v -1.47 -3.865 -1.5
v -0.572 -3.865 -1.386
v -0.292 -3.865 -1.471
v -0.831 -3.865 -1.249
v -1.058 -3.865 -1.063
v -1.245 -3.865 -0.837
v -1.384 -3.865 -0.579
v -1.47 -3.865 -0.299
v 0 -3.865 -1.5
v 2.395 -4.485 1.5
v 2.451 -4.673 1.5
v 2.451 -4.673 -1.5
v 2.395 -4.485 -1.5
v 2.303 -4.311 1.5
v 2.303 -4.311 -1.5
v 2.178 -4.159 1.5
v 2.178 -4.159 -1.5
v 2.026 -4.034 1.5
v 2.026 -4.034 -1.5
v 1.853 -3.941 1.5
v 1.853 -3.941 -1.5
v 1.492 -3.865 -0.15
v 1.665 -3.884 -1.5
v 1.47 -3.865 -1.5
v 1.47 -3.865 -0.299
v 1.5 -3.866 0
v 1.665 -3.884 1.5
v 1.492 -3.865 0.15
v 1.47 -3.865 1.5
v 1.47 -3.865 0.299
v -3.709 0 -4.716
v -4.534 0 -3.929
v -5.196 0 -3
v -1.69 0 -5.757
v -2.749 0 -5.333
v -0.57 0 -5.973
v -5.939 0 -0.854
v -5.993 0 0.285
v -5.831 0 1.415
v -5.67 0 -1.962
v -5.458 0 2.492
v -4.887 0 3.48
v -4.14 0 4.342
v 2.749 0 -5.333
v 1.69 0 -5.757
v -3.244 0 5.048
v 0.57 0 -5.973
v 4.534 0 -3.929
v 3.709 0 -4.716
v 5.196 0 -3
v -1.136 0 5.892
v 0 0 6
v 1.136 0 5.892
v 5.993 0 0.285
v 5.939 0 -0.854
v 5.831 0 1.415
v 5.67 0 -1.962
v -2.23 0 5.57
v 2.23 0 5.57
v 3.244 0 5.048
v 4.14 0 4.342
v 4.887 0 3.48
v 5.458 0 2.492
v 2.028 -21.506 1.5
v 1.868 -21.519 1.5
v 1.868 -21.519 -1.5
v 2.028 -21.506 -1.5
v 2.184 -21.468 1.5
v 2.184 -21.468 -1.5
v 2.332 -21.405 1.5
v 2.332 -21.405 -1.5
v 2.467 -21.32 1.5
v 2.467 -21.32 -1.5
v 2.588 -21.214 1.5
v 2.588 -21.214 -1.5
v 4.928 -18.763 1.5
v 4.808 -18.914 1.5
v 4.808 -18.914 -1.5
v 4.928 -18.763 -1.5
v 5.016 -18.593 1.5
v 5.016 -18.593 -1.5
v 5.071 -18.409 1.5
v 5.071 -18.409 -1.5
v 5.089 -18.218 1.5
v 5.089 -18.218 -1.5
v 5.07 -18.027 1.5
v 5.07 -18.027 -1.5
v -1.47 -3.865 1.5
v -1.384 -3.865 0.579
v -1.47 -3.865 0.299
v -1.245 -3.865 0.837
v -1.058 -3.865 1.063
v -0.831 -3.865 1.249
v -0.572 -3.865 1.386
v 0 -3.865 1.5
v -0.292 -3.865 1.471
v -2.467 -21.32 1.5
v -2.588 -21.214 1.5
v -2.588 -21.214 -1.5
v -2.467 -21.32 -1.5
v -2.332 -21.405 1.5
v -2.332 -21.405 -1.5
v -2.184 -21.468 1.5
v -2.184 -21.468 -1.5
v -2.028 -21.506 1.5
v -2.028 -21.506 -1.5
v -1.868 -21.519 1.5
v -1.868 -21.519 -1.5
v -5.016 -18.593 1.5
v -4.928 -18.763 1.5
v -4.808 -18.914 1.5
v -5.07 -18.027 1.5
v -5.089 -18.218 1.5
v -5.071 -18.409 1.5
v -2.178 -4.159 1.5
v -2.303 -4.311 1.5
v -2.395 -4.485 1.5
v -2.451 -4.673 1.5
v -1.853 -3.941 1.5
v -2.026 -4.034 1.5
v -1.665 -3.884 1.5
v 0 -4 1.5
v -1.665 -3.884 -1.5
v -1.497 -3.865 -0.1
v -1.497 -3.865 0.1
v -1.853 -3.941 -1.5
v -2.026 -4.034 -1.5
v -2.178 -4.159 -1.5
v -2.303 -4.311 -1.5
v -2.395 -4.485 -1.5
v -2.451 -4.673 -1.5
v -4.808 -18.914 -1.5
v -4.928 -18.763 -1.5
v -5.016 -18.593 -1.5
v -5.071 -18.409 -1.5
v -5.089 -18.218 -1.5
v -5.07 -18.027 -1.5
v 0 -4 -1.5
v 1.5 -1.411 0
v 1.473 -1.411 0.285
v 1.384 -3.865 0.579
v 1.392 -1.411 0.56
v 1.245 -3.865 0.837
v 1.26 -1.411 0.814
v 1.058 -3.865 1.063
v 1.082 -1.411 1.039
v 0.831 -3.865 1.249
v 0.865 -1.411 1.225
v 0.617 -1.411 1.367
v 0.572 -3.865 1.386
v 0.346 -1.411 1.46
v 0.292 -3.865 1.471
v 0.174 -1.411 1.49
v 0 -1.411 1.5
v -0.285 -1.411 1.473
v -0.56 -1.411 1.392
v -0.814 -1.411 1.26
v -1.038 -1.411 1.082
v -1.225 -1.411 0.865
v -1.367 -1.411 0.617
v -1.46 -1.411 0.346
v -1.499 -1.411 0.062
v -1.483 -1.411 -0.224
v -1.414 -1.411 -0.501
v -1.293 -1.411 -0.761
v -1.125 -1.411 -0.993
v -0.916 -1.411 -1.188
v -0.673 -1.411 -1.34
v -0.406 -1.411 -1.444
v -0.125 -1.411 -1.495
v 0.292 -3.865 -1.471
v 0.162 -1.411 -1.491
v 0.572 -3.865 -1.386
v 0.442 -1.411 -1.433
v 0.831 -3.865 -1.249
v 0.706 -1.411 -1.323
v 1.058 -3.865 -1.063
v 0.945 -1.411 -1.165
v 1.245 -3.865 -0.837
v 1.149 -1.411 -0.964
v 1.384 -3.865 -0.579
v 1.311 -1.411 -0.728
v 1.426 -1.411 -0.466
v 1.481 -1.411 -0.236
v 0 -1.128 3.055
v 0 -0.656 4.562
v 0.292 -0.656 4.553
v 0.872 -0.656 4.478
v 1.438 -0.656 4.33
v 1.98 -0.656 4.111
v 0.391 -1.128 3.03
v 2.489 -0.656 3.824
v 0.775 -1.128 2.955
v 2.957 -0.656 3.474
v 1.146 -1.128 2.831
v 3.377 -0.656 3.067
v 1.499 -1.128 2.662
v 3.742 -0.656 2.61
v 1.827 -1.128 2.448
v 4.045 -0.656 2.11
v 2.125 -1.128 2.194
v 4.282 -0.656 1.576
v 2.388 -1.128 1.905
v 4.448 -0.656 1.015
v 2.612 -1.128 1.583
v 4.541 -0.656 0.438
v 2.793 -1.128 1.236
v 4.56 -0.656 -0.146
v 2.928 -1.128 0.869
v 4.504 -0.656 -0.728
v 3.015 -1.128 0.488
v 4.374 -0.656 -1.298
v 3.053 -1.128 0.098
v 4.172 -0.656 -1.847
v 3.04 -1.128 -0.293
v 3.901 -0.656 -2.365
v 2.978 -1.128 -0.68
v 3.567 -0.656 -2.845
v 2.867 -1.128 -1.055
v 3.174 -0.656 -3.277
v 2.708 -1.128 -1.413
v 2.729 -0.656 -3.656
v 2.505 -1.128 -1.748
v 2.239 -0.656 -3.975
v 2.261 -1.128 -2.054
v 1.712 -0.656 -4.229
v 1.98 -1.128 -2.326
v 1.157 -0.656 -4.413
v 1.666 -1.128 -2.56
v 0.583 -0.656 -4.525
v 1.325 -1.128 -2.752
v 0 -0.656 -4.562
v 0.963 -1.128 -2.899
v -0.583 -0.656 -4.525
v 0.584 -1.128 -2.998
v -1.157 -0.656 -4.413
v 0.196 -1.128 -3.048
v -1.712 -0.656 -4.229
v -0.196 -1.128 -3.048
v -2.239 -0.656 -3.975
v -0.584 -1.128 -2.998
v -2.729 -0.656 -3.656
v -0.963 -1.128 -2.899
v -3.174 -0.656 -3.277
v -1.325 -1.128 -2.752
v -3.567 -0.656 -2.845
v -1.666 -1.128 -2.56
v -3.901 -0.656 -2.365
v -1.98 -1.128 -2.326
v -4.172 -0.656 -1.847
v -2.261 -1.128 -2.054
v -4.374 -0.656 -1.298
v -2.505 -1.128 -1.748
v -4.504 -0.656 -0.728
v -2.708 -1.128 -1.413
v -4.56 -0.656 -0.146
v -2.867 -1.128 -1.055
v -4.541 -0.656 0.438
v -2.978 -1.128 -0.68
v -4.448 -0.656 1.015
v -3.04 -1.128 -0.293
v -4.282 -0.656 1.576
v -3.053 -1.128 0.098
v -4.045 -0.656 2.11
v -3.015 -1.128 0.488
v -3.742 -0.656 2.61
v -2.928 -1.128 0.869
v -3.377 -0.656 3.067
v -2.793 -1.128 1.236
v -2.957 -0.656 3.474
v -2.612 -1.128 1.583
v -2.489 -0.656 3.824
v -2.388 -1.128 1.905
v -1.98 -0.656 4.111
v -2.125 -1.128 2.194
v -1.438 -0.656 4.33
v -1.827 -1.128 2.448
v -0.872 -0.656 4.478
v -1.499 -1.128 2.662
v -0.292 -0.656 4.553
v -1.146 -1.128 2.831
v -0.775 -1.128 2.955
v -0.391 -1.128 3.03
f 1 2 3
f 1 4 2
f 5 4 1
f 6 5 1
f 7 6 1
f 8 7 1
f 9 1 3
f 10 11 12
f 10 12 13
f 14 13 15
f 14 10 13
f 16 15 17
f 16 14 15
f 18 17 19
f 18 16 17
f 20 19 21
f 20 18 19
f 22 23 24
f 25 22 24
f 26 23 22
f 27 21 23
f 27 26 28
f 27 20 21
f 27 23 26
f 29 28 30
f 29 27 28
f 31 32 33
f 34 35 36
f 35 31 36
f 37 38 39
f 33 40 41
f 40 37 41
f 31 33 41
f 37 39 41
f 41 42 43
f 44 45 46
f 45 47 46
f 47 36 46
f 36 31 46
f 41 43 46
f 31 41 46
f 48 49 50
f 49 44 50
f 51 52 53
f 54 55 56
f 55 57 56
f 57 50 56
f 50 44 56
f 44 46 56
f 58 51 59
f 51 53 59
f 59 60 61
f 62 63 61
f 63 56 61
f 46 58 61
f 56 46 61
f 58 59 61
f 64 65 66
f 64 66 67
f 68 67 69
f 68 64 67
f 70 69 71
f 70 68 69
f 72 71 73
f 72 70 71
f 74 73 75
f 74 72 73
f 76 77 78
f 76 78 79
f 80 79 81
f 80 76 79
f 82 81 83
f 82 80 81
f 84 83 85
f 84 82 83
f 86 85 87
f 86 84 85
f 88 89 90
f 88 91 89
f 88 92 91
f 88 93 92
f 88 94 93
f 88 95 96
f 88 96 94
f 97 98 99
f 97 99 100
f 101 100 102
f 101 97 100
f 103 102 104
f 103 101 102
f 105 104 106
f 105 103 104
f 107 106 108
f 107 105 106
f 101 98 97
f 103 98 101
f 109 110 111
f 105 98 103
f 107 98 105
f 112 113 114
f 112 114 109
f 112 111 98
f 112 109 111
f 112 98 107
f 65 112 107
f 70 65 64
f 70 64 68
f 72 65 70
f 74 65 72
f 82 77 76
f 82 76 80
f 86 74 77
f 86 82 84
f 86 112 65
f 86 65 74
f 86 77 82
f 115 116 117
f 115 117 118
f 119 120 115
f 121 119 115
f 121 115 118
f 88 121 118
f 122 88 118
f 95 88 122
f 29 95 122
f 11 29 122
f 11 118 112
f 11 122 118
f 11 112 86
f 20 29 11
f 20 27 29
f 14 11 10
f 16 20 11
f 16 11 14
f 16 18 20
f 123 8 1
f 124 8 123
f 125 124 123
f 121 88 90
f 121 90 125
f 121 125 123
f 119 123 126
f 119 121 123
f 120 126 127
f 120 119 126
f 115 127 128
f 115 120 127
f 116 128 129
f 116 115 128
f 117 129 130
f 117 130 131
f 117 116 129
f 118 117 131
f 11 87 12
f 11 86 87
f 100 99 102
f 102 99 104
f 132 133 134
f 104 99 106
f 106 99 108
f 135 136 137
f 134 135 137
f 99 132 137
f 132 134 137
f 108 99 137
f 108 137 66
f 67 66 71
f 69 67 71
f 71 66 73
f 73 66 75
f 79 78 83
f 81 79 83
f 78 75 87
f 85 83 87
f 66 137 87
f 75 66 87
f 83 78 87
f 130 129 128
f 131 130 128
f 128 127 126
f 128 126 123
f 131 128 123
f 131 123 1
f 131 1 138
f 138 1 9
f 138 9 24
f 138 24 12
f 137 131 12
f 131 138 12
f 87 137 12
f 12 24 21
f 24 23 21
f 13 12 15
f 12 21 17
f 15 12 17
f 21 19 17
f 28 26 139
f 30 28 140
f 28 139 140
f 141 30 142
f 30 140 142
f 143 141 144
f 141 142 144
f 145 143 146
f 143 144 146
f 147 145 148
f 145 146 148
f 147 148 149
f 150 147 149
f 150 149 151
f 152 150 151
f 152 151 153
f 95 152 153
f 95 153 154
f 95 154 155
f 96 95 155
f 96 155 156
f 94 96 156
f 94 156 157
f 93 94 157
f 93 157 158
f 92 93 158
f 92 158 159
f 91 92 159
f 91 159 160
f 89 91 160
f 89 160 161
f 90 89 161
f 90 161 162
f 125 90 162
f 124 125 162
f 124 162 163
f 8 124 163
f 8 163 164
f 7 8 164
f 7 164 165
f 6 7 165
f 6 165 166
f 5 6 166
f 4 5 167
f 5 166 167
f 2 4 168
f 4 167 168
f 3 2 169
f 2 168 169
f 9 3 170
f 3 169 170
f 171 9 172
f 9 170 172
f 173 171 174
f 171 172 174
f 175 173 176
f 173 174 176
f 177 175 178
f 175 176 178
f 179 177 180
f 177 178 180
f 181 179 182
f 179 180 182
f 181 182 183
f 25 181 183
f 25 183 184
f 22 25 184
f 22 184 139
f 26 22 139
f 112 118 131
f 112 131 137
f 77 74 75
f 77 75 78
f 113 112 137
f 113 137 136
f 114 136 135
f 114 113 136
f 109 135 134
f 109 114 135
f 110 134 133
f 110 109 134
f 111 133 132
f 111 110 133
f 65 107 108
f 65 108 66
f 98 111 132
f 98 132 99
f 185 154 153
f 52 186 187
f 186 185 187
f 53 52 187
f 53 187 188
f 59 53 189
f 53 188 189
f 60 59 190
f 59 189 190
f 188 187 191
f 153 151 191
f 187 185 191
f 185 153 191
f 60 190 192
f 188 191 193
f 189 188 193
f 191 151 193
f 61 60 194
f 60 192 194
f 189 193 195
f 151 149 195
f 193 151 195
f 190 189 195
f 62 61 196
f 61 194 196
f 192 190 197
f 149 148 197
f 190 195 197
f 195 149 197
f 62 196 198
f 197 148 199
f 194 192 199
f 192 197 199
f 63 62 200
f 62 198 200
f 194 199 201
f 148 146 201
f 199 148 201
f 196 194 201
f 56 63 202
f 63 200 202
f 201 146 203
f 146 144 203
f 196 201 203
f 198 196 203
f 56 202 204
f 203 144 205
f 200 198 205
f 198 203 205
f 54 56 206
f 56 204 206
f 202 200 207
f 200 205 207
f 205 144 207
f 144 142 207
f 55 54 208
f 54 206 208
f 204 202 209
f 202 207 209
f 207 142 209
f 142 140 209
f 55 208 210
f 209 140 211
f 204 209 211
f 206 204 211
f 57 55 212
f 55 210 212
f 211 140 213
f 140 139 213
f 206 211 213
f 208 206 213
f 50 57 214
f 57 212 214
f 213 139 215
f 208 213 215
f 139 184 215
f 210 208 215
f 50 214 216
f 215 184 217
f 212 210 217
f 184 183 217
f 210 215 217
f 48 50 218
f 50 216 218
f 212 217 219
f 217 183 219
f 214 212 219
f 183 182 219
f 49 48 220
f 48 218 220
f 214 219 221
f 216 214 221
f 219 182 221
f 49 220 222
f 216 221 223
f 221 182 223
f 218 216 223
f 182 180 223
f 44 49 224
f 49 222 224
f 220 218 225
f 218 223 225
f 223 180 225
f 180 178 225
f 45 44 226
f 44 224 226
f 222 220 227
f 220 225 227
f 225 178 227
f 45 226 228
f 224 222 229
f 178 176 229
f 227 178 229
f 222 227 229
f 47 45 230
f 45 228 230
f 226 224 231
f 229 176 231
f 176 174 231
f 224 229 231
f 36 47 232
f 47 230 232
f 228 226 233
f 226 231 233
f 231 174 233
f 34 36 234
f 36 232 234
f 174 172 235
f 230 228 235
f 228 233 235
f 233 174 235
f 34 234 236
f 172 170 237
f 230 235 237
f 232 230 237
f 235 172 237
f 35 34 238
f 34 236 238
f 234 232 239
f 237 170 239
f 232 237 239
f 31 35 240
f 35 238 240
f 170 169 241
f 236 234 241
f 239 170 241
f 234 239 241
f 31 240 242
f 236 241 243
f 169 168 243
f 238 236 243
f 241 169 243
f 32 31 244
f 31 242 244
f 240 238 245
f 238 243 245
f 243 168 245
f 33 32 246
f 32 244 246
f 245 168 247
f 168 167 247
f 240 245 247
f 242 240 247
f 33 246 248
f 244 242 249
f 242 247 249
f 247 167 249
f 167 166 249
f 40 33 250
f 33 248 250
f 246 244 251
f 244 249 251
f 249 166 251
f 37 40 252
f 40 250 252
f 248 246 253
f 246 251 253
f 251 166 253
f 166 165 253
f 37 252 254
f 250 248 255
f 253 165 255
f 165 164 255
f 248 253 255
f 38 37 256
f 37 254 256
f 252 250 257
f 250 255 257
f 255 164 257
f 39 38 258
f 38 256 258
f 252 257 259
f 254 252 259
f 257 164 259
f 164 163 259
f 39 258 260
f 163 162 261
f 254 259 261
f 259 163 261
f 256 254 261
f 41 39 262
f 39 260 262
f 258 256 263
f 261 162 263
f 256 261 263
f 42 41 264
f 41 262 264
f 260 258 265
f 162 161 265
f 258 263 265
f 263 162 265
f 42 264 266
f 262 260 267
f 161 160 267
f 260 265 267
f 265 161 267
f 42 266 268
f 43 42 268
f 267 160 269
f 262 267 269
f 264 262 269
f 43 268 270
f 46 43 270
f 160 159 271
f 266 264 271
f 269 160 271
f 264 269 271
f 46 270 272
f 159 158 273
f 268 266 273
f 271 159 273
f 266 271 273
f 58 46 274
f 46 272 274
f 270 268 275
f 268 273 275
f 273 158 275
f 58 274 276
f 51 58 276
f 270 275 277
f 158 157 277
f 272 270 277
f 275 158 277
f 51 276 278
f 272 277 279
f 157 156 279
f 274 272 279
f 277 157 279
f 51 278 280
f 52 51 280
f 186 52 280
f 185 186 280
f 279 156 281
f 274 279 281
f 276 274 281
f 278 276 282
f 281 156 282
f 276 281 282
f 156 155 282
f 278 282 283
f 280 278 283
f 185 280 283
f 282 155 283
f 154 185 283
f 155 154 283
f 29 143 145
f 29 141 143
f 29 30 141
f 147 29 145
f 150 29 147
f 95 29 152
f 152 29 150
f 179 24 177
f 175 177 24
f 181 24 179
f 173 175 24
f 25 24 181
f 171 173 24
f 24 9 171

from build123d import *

# Parameters (mm, degrees)
F2_R     = 1.5
F3_DEPTH = 4
F5_DEPTH = 1.5


with BuildPart() as f1:
    # F0 (on Right) → F1 (revolve)
    with BuildSketch(Plane.YZ):
        with BuildLine():
            Line((0, 0), (0, 6))
            ThreePointArc((0, 6), (-1.1189941578, 3.0922762594), (-1.4995632221, 0))
            Line((-1.4995632221, 0), (0, 0))
        make_face()
    revolve(axis=Axis((0, 0.9339665994, 0), (0, 1, 0)))

    # F2 (on Front) → F3 (join)
    with BuildSketch(Plane.XZ):
        Circle(F2_R)
    extrude(amount=F3_DEPTH)

    # F4 (on Top) → F5 (join, symmetric)
    with BuildSketch(Plane.XY):
        with BuildLine():
            Line((1.4699705266, -3.8650664501), (0, -3.8650664501))
            Line((0, -3.8650664501), (-1.4699705266, -3.8650664501))
            ThreePointArc((-1.4699705266, -3.8650664501), (-2.105403361, -4.0929103047), (-2.4512772628, -4.6726162242))
            Line((-2.4512772628, -4.6726162242), (-5.0702010152, -18.0265497334))
            ThreePointArc((-5.0702010152, -18.0265497334), (-5.0479765813, -18.5021273815), (-4.8083588564, -18.913529096))
            Line((-4.8083588564, -18.913529096), (-2.5877873591, -21.213825008))
            ThreePointArc((-2.5877873591, -21.213825008), (-2.2591365885, -21.4397656254), (-1.8683227817, -21.5192958713))
            Line((-1.8683227817, -21.5192958713), (0, -21.5192958713))
            Line((0, -21.5192958713), (1.8683227817, -21.5192958713))
            ThreePointArc((1.8683227817, -21.5192958713), (2.2591365885, -21.4397656254), (2.5877873591, -21.213825008))
            Line((2.5877873591, -21.213825008), (4.8083588564, -18.913529096))
            ThreePointArc((4.8083588564, -18.913529096), (5.0479765813, -18.5021273815), (5.0702010152, -18.0265497334))
            Line((5.0702010152, -18.0265497334), (2.4512772628, -4.6726162242))
            ThreePointArc((2.4512772628, -4.6726162242), (2.105403361, -4.0929103047), (1.4699705266, -3.8650664501))
        make_face()
    extrude(amount=F5_DEPTH, both=True)


solid = f1.part
